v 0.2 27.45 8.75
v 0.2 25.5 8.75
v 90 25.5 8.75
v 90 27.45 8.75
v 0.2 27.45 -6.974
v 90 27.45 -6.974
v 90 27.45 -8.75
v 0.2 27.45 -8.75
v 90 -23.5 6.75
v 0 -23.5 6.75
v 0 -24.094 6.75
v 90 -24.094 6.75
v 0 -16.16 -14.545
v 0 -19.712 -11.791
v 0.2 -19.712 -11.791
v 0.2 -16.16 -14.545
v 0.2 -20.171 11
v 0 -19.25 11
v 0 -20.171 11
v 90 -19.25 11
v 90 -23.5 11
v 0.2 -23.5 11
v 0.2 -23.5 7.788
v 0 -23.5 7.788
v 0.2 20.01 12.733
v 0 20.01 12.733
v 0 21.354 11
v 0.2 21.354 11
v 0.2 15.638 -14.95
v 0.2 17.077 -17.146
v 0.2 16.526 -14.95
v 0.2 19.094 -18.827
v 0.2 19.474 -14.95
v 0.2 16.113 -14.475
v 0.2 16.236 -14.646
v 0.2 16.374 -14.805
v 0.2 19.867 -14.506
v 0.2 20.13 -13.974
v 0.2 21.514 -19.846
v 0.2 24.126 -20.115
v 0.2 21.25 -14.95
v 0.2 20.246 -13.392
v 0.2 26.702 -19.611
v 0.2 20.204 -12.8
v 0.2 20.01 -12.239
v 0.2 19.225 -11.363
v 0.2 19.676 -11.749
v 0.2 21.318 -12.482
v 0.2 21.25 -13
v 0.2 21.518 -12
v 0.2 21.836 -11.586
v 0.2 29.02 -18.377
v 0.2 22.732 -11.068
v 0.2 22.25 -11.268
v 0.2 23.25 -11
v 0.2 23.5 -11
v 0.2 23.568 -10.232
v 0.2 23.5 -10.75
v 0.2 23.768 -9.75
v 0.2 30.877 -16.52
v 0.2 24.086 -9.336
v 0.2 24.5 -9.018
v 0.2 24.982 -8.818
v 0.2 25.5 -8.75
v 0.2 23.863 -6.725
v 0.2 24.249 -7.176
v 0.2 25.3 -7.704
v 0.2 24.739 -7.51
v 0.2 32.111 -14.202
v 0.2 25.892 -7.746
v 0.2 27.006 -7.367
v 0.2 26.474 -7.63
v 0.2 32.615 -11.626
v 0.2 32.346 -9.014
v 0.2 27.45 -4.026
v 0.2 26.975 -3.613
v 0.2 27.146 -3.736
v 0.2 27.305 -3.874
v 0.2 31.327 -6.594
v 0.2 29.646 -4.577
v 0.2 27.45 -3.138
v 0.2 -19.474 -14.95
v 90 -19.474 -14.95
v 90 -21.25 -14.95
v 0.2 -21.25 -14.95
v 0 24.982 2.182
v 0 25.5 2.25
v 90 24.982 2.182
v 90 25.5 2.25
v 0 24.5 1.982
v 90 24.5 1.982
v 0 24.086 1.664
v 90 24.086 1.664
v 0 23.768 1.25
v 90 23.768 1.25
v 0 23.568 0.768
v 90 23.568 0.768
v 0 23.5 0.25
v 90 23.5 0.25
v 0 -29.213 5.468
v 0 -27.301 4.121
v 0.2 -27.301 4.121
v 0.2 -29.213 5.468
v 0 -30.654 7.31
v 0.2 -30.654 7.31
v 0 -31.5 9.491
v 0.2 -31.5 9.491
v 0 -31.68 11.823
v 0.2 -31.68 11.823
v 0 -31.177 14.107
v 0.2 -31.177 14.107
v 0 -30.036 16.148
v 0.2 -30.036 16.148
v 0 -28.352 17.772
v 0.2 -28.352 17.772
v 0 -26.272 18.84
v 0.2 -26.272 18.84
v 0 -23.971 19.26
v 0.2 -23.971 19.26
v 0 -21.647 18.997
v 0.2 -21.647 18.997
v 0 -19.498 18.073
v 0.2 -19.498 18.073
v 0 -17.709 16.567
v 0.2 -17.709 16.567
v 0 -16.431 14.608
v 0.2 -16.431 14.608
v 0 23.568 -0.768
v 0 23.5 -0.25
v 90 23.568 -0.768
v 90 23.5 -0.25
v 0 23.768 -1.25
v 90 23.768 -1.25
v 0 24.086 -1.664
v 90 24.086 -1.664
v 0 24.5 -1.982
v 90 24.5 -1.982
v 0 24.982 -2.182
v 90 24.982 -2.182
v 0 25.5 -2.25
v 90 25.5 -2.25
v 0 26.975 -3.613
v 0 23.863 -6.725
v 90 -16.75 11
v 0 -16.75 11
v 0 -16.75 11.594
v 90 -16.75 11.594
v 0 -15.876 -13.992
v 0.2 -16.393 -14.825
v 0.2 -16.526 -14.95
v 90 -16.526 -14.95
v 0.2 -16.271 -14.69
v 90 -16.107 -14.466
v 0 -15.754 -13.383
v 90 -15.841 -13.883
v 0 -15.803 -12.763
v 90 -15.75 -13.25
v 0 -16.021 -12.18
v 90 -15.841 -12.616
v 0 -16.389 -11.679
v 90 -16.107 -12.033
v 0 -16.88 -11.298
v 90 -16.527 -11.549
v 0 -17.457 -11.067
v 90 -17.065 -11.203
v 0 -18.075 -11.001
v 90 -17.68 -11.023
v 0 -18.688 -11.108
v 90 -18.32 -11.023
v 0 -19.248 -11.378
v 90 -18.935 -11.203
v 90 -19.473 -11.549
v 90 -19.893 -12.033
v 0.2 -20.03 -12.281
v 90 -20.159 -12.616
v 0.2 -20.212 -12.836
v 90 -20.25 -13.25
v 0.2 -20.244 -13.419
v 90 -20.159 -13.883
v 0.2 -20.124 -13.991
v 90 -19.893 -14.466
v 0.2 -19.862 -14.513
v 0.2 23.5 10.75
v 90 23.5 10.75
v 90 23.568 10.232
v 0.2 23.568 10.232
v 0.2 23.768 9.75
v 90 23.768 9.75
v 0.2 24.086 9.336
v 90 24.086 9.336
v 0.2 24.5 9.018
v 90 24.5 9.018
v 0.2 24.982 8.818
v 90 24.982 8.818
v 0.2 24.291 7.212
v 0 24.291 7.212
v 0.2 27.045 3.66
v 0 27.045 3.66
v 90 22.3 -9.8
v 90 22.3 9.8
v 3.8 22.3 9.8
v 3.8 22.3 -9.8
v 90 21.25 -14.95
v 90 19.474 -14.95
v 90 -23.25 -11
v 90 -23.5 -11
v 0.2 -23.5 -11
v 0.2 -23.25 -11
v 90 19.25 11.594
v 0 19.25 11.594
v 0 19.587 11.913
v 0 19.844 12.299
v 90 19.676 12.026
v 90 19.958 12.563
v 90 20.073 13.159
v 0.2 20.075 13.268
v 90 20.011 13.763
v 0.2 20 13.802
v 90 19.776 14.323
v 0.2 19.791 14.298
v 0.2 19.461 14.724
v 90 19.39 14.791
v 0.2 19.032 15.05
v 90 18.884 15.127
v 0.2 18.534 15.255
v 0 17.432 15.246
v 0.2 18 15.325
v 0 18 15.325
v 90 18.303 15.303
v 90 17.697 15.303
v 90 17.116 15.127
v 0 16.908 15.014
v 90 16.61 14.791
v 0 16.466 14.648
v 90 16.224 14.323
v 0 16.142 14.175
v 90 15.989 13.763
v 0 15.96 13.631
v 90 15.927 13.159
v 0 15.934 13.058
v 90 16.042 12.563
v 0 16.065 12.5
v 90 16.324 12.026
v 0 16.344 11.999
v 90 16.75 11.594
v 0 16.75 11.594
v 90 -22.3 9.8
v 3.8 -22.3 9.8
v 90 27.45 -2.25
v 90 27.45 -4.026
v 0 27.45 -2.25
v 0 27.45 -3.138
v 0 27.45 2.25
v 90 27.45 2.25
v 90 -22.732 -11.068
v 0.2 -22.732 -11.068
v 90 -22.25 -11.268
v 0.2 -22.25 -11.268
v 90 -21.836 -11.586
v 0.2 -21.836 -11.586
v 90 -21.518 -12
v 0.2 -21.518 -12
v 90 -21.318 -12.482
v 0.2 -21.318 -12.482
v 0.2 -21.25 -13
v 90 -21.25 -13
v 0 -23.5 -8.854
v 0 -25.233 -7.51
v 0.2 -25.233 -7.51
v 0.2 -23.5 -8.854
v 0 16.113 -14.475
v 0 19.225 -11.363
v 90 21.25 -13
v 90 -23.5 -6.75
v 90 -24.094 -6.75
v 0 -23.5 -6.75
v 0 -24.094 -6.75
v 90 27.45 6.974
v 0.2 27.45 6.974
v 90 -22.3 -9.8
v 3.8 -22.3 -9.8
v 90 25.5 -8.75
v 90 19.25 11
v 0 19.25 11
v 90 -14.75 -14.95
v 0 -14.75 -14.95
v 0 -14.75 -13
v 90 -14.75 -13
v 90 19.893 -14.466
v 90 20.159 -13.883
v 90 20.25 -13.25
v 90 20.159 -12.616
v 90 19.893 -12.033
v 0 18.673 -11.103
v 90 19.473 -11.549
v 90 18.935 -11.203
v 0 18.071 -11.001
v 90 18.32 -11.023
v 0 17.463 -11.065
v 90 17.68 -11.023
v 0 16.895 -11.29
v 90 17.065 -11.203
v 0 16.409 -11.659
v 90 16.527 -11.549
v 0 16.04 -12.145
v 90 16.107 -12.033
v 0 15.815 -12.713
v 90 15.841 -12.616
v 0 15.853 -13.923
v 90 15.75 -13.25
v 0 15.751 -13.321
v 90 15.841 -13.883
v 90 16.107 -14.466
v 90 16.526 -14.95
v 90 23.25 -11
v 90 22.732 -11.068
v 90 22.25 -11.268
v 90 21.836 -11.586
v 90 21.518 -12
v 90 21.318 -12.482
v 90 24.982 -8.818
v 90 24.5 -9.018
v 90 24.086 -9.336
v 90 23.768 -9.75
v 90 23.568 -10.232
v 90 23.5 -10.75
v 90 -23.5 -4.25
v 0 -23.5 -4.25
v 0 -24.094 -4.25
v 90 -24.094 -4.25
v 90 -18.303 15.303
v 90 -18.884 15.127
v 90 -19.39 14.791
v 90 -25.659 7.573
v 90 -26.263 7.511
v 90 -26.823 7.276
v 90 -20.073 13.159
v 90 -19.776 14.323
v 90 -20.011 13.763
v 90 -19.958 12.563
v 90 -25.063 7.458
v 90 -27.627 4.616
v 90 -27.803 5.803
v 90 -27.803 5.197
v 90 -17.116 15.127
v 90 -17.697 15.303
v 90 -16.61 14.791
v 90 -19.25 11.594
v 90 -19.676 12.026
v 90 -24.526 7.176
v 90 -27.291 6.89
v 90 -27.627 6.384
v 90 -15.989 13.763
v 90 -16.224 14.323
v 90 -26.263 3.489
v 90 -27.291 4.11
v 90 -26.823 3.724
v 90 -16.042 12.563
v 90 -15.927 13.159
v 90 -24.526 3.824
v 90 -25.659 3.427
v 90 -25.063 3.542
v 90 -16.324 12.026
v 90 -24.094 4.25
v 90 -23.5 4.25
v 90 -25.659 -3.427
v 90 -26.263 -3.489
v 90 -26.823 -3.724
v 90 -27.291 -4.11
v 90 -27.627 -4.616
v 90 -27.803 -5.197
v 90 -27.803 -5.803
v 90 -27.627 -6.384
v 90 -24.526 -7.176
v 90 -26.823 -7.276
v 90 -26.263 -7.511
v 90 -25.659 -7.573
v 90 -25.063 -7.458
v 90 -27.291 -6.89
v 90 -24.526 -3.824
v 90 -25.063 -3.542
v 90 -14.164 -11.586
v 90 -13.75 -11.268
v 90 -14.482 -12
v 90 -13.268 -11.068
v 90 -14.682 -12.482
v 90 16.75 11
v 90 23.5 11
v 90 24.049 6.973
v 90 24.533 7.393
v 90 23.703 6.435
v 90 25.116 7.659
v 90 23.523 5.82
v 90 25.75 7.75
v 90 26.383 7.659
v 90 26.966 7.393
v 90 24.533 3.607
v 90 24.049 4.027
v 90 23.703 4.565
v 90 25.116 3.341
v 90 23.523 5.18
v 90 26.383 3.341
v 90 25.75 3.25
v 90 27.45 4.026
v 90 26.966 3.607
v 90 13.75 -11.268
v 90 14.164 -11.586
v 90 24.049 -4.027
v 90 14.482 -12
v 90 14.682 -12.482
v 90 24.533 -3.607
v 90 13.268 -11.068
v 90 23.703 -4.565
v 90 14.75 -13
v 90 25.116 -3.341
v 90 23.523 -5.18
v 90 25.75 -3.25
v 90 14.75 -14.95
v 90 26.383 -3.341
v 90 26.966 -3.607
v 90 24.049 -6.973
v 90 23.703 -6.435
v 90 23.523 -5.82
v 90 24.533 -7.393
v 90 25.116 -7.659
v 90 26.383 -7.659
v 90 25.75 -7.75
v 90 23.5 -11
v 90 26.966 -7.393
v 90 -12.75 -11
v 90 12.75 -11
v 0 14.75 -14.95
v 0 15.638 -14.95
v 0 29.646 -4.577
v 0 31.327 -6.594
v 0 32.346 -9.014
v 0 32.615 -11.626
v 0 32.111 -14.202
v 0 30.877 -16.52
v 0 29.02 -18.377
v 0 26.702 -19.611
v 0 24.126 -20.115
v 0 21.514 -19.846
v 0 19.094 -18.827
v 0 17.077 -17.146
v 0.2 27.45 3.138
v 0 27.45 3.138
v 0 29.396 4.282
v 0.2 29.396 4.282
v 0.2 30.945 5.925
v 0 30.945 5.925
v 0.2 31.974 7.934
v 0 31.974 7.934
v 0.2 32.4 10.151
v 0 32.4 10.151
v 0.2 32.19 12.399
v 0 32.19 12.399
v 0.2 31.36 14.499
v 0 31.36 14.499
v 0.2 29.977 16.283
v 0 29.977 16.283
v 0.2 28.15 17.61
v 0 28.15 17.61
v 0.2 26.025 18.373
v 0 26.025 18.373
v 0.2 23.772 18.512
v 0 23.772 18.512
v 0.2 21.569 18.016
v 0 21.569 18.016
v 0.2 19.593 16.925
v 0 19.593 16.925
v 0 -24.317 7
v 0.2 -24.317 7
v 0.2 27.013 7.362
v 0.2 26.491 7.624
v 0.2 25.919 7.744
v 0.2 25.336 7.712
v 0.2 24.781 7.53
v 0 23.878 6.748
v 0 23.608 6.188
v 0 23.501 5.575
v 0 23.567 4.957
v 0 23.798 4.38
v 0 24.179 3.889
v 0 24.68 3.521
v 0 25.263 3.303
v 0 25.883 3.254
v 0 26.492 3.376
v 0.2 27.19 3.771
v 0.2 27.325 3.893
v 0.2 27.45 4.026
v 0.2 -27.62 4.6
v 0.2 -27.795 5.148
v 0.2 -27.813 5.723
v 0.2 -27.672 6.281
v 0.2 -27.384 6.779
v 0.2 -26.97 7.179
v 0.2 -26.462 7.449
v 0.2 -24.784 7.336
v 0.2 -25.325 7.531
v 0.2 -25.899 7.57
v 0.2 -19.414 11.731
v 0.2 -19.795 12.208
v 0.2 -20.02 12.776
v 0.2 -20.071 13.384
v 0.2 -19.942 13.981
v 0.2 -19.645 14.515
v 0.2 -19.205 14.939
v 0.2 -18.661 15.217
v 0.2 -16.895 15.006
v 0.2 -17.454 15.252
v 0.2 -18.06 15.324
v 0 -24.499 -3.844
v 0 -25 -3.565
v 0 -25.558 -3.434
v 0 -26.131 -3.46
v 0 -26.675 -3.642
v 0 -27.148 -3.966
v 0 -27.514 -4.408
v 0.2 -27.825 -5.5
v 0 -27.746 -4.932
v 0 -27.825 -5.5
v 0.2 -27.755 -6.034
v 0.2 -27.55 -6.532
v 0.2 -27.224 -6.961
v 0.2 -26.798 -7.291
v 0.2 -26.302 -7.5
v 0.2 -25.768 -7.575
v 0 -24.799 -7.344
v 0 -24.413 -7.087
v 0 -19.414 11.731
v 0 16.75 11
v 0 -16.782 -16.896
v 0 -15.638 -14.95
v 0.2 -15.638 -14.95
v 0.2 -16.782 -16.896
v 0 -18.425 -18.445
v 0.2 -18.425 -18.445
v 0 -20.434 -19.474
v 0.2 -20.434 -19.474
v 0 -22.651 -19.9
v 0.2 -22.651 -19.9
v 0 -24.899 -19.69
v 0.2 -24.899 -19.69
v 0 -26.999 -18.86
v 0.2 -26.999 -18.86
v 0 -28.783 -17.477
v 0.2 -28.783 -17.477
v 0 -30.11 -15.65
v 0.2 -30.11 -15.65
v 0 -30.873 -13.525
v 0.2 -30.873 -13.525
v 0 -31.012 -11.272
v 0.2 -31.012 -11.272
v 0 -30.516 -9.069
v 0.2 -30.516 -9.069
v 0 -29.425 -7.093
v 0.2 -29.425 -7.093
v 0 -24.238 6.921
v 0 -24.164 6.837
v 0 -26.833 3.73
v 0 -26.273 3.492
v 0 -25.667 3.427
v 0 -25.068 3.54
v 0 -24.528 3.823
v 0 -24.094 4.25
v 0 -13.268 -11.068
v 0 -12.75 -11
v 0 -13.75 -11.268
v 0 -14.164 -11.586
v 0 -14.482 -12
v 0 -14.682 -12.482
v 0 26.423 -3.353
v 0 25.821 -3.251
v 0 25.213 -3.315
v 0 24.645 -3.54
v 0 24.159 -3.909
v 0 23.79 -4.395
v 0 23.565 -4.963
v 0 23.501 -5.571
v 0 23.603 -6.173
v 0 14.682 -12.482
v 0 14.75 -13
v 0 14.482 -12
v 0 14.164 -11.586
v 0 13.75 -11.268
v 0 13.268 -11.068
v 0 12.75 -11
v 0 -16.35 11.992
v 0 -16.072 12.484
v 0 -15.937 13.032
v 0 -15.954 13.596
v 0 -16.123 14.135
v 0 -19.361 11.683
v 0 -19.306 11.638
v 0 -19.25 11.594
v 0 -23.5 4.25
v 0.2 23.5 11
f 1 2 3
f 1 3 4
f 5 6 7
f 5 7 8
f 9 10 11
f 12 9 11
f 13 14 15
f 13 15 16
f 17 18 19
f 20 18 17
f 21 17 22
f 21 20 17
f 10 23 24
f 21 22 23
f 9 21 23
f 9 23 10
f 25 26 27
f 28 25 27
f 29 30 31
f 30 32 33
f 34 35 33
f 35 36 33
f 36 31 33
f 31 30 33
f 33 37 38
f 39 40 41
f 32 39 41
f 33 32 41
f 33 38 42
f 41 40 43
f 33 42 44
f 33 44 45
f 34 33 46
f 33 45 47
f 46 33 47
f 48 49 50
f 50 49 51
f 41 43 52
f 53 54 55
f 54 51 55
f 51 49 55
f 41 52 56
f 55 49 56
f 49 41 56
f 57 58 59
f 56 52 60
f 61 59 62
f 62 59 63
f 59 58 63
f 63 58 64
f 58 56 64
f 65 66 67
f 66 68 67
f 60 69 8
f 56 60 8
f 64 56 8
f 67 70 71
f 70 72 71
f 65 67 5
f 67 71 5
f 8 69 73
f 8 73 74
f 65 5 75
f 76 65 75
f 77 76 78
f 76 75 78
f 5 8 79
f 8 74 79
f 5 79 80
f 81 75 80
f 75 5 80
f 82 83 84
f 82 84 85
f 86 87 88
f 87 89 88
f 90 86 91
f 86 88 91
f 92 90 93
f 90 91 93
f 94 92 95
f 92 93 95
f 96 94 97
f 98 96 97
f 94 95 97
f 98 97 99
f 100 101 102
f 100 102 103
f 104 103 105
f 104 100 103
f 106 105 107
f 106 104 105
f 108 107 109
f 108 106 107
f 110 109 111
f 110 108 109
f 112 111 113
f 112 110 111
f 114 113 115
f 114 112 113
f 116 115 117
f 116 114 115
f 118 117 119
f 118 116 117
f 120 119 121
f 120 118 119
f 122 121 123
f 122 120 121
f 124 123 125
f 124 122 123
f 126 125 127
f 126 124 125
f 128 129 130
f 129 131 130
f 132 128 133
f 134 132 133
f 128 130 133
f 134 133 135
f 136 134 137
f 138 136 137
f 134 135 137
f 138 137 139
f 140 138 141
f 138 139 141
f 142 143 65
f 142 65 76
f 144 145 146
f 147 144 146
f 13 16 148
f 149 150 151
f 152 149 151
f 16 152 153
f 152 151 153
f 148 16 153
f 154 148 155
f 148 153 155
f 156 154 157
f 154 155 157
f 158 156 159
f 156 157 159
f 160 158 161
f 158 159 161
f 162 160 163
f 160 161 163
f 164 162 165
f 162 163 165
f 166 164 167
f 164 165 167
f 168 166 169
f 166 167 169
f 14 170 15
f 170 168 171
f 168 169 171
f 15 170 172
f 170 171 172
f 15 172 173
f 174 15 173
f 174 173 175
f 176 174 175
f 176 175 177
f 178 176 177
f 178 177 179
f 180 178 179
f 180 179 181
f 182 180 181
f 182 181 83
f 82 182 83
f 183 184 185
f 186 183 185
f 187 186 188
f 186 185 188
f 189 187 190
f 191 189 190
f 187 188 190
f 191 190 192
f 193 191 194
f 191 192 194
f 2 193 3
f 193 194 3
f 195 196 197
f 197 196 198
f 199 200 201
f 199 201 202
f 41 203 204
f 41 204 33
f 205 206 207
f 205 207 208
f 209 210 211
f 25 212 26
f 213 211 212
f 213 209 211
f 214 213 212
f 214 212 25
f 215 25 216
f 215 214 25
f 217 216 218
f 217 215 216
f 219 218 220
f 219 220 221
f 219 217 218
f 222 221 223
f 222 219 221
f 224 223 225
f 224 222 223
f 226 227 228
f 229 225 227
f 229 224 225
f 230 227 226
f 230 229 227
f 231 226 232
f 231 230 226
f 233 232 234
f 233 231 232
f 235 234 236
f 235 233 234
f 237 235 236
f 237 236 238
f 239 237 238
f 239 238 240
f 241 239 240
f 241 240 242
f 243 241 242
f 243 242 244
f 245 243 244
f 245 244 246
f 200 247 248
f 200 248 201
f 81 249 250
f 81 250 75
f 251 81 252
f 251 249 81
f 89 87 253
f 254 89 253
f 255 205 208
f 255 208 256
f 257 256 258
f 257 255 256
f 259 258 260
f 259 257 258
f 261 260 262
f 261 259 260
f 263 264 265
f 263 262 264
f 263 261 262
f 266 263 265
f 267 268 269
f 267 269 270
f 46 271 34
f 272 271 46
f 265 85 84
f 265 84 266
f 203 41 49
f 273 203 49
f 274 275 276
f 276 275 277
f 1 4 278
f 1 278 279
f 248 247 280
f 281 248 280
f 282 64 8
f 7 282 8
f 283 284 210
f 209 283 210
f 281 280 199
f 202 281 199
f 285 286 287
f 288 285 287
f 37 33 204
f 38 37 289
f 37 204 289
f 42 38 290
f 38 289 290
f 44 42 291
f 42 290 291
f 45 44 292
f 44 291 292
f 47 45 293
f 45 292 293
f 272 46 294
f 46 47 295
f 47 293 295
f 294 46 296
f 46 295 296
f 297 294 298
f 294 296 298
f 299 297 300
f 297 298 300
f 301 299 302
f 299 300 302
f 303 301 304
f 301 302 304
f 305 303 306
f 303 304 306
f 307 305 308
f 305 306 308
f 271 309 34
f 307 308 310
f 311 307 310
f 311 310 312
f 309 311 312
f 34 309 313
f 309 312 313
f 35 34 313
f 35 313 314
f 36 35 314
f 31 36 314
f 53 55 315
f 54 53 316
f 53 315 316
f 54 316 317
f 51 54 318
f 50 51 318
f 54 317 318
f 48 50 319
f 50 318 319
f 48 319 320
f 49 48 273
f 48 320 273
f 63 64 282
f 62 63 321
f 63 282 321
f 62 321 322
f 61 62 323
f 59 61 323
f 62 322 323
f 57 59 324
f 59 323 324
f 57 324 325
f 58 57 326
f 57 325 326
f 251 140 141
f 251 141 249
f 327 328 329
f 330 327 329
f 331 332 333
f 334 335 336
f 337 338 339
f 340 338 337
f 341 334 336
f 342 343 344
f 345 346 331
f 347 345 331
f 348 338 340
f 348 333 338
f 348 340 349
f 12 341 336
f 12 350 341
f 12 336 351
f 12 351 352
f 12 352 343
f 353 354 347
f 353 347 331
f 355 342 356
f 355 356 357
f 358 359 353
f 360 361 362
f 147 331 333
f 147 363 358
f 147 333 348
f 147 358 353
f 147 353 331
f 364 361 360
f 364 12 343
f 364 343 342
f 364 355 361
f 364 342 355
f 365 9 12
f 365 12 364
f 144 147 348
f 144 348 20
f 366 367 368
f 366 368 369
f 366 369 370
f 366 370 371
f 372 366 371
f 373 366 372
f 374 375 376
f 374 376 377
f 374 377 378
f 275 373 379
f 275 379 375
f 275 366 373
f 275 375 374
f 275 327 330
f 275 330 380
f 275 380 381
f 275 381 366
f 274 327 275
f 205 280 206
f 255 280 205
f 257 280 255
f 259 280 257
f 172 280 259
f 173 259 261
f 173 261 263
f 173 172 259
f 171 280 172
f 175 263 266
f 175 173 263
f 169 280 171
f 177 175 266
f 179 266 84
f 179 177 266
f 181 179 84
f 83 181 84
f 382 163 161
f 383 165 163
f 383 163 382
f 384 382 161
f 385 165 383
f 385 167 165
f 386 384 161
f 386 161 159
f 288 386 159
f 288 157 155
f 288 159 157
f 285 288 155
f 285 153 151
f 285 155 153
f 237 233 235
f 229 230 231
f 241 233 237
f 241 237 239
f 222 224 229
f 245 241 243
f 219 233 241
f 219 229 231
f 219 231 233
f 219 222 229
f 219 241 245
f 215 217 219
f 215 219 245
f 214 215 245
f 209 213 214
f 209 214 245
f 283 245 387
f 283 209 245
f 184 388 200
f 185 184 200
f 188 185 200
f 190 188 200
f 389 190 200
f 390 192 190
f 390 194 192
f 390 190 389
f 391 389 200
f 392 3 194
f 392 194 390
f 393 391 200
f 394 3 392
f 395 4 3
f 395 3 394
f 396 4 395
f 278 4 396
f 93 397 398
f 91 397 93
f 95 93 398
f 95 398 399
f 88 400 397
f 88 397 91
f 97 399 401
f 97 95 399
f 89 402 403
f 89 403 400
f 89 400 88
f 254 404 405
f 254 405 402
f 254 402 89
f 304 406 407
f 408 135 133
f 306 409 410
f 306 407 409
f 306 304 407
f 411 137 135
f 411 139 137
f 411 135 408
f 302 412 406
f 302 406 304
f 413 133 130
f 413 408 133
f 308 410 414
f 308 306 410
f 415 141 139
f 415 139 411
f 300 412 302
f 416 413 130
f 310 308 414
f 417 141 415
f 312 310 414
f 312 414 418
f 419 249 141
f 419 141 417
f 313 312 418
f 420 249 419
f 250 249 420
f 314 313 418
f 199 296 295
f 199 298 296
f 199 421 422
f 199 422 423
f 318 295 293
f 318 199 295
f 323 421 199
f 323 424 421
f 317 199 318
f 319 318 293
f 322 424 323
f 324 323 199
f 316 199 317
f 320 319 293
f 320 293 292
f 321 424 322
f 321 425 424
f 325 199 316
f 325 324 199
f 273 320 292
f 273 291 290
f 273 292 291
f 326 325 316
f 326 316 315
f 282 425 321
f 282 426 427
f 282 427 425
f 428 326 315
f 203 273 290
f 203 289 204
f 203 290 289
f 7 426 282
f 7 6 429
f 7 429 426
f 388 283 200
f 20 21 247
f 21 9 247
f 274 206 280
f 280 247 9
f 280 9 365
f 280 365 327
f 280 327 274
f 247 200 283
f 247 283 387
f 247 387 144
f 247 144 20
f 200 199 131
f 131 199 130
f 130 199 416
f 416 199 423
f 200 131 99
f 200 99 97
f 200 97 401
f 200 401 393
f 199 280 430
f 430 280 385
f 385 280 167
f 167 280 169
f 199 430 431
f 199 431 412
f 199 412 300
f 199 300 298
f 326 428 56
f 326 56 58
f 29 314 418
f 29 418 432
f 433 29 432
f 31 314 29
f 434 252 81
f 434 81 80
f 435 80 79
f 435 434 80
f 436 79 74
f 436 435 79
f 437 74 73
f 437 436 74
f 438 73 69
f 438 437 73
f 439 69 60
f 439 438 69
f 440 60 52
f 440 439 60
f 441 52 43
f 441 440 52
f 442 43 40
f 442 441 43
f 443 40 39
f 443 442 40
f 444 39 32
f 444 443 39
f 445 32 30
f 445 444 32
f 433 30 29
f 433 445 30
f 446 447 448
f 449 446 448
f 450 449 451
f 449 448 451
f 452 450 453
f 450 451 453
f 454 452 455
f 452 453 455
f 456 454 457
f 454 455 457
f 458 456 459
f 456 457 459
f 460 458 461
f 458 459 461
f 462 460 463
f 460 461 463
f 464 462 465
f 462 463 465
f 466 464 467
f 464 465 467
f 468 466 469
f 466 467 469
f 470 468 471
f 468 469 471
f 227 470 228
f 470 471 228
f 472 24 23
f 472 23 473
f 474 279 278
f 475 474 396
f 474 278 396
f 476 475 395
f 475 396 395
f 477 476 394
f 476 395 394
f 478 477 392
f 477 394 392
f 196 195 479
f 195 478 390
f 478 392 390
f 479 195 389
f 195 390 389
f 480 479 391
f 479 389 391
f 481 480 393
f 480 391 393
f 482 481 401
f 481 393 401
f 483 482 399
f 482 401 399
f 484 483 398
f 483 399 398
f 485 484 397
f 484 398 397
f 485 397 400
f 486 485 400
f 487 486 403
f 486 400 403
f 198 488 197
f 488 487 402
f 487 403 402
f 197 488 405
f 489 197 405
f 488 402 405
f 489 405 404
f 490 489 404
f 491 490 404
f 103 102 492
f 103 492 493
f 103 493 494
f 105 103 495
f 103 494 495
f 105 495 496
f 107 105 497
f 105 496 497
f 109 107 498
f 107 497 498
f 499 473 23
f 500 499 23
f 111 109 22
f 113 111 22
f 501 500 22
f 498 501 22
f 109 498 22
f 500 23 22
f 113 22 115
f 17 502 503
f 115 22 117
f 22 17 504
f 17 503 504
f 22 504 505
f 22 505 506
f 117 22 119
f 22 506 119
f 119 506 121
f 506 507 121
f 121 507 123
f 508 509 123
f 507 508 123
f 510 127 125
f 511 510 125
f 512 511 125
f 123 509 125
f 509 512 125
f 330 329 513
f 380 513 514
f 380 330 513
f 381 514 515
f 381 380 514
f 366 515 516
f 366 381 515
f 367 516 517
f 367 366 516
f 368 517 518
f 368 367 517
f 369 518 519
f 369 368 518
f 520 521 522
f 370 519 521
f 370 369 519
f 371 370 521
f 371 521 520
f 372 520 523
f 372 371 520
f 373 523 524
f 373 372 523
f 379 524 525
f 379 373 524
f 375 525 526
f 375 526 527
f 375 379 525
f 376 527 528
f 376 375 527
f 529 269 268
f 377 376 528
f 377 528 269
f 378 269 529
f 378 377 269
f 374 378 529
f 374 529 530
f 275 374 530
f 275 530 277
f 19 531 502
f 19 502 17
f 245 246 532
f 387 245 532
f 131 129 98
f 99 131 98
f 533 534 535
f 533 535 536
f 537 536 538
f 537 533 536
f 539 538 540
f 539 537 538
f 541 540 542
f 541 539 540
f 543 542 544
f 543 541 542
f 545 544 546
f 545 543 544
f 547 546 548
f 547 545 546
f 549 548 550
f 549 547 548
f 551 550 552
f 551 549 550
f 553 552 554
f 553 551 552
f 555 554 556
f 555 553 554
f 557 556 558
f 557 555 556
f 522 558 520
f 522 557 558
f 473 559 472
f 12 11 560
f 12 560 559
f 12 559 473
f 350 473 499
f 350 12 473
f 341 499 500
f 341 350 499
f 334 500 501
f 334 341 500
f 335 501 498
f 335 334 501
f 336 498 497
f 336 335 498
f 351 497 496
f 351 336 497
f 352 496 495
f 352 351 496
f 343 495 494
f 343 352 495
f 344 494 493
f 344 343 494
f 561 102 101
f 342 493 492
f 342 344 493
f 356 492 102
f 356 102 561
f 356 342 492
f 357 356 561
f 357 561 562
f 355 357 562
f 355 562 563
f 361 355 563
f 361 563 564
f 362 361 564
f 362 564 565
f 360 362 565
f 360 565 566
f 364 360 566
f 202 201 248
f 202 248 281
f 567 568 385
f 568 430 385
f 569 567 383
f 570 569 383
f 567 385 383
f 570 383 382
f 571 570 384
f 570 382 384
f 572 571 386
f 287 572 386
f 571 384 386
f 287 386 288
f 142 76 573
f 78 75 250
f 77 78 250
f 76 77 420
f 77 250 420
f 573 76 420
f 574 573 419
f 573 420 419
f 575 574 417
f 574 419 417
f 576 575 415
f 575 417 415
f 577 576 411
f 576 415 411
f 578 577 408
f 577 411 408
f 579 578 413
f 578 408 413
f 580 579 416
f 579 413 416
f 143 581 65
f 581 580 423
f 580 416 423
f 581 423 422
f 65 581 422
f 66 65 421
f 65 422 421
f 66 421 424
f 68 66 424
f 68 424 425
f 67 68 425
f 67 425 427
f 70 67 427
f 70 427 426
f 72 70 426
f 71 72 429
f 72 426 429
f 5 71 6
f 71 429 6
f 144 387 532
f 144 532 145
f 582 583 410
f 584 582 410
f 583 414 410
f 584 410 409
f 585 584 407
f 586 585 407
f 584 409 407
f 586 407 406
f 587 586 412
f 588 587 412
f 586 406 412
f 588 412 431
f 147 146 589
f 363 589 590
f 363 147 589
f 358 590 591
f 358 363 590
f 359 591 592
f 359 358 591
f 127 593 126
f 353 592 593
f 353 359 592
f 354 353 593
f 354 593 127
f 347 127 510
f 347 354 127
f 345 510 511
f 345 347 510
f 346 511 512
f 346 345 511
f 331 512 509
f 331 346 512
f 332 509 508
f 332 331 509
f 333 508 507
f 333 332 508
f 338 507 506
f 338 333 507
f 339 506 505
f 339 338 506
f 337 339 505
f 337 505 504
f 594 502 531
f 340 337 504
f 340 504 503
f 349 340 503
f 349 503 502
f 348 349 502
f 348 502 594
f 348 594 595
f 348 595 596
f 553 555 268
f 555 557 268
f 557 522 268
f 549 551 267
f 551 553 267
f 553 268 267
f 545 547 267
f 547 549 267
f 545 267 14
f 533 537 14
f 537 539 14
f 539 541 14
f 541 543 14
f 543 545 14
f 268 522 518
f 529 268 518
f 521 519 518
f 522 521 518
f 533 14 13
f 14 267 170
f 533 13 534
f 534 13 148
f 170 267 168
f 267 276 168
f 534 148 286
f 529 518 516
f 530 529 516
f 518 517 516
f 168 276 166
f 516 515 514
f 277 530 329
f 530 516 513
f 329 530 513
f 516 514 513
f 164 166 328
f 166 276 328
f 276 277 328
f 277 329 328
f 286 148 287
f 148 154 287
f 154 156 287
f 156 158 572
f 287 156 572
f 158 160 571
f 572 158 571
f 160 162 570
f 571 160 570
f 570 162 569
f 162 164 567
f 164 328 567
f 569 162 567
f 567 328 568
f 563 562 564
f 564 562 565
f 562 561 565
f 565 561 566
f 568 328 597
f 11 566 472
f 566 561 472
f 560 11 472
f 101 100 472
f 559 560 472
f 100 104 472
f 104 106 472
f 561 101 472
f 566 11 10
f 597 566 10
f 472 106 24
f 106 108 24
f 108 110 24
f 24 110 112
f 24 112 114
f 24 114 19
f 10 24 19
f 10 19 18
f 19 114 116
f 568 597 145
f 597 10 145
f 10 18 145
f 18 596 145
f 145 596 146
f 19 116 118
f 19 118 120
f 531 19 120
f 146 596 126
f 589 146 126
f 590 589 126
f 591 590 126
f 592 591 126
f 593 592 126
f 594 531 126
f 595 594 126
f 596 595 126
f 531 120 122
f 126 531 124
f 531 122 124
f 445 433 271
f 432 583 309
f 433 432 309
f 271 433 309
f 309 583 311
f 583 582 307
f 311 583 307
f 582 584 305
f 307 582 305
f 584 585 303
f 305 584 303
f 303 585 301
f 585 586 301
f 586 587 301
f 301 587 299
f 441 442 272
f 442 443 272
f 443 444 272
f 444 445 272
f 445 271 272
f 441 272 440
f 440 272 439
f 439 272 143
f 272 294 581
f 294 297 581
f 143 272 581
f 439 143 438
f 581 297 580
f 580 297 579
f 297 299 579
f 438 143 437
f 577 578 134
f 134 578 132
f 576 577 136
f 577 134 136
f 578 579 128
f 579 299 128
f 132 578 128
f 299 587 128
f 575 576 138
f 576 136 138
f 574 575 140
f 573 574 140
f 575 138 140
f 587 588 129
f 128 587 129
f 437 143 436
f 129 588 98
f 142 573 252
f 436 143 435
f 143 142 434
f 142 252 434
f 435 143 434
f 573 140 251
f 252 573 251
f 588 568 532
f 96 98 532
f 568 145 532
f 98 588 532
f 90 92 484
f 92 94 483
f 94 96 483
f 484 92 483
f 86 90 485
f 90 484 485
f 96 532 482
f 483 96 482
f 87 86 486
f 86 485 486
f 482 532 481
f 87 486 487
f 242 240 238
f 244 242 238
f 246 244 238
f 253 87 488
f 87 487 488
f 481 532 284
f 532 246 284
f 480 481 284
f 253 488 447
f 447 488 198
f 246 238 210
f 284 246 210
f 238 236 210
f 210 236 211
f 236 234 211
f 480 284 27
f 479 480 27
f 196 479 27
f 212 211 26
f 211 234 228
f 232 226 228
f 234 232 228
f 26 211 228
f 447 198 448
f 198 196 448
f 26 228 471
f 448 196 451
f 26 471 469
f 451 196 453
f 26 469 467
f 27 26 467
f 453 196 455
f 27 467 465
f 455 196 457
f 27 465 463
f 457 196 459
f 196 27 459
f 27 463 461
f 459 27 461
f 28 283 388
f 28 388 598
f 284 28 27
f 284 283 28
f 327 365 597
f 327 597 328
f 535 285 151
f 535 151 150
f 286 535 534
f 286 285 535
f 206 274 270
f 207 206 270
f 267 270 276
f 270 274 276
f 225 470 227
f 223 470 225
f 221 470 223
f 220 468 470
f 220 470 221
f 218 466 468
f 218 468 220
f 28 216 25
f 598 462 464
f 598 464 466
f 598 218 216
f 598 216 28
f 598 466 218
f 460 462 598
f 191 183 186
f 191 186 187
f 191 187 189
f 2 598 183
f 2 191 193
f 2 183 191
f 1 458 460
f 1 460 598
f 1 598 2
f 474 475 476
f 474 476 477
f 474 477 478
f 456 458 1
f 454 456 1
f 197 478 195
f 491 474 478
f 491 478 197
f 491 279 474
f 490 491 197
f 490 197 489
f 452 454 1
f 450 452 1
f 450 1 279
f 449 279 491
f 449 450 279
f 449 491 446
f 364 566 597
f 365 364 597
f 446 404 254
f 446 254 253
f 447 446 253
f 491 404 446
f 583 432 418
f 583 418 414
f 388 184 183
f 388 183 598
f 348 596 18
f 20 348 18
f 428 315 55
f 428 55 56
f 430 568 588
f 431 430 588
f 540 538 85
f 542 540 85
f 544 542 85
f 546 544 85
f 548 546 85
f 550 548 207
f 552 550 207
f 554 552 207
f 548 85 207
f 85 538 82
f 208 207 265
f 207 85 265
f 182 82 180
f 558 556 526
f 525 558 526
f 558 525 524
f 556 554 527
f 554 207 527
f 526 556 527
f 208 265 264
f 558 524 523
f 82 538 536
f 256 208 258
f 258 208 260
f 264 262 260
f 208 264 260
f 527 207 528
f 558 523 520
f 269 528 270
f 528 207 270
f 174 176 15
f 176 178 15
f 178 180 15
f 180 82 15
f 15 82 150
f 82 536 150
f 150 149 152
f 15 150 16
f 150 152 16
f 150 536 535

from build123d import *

# Parameters (mm, degrees)
EXTRUDE_1_DEPTH             = 90
SKETCH_2_W                  = 90
SKETCH_2_H                  = 17.75
EXTRUDE_2_DEPTH             = 8.2
SKETCH_3_W                  = 90
SKETCH_3_H                  = 50.95
EXTRUDE_3_DEPTH             = 8.2
SKETCH_4_W                  = 3.95
SKETCH_4_H                  = 29.5
CUT_EXTRUDE_1_DEPTH         = 91
SKETCH_5_W                  = 3.95
SKETCH_5_H                  = 6.2
CUT_EXTRUDE_2_DEPTH         = 91
SKETCH_6_W                  = 2.25
SKETCH_6_H                  = 3.95
CUT_EXTRUDE_3_DEPTH         = 91
SKETCH_7_W                  = 4.5
SKETCH_7_H                  = 3.95
CUT_EXTRUDE_4_DEPTH         = 91
SKETCH_8_W                  = 2.25
SKETCH_8_H                  = 3.95
CUT_EXTRUDE_5_DEPTH         = 91
SKETCH_9_W                  = 3.95
SKETCH_9_H                  = 2.25
CUT_EXTRUDE_6_DEPTH         = 91
SKETCH_10_W                 = 19.6
SKETCH_10_H                 = 44.6
CUT_EXTRUDE_7_DEPTH         = 86.2
HOLE_WIZARD_2_5_2_5_1_D     = 2.5
HOLE_WIZARD_2_5_2_5_1_DEPTH = 90
HOLE_WIZARD_4_5_4_5_1_D     = 4.5
HOLE_WIZARD_4_5_4_5_1_DEPTH = 90
FILLET_1_R                  = 2
FILLET_2_R                  = 2
SKETCH_17_R                 = 1.25
EXTRUDE_4_DEPTH             = 90
EXTRUDE_5_DEPTH             = 0.2


with BuildPart() as part:
    # Эскиз1 → Бобышка-Вытянуть1 (new body)
    with BuildSketch(Plane(origin=(90, 0, 0), x_dir=(0, 0, -1), z_dir=(1, 0, 0))):
        with BuildLine():
            Line((6.75, -24.093761792), (6.75, 19.25))
            Line((6.75, 19.25), (-11.593761792, 19.25))
            ThreePointArc((-11.593761792, 19.25), (-15.325, 18), (-11.593761792, 16.75))
            Line((-11.593761792, 16.75), (-11, 16.75))
            Line((-11, 16.75), (-11, -16.75))
            Line((-11, -16.75), (-11.593761792, -16.75))
            ThreePointArc((-11.593761792, -16.75), (-15.325, -18), (-11.593761792, -19.25))
            Line((-11.593761792, -19.25), (-11, -19.25))
            Line((-11, -19.25), (-11, -23.5))
            Line((-11, -23.5), (-6.75, -23.5))
            Line((-6.75, -23.5), (-6.75, -24.093761792))
            ThreePointArc((-6.75, -24.093761792), (-5.5, -27.825), (-4.25, -24.093761792))
            Line((-4.25, -24.093761792), (-4.25, -23.5))
            Line((-4.25, -23.5), (4.25, -23.5))
            Line((4.25, -23.5), (4.25, -24.093761792))
            ThreePointArc((4.25, -24.093761792), (5.5, -27.825), (6.75, -24.093761792))
        make_face()
    extrude(amount=-EXTRUDE_1_DEPTH)

    # Эскиз2 → Бобышка-Вытянуть2 (add)
    with BuildSketch(Plane(origin=(0, 19.25, 0), x_dir=(-1, 0, 0), z_dir=(0, 1, 0))):
        with Locations((-45, 2.125)):
            Rectangle(SKETCH_2_W, SKETCH_2_H)
    extrude(amount=EXTRUDE_2_DEPTH)

    # Эскиз3 → Бобышка-Вытянуть3 (add)
    with BuildSketch(Plane(origin=(0, 0, -6.75), x_dir=(-1, 0, 0), z_dir=(0, 0, -1))):
        with Locations((-45, 1.975)):
            Rectangle(SKETCH_3_W, SKETCH_3_H)
    extrude(amount=EXTRUDE_3_DEPTH)

    # Эскиз4 → Вырез-Вытянуть1 (cut, through all)
    with BuildSketch(Plane.ZY):
        with Locations((-12.975, 0)):
            Rectangle(SKETCH_4_W, SKETCH_4_H)
    extrude(amount=-CUT_EXTRUDE_1_DEPTH, mode=Mode.SUBTRACT)

    # Эскиз5 → Вырез-Вытянуть2 (cut, through all)
    with BuildSketch(Plane.ZY):
        with Locations((-12.975, 24.35)):
            Rectangle(SKETCH_5_W, SKETCH_5_H)
    extrude(amount=-CUT_EXTRUDE_2_DEPTH, mode=Mode.SUBTRACT)

    # Эскиз6 → Вырез-Вытянуть3 (cut, through all)
    with BuildSketch(Plane.ZY):
        with Locations((-9.875, 25.475)):
            Rectangle(SKETCH_6_W, SKETCH_6_H)
    extrude(amount=-CUT_EXTRUDE_3_DEPTH, mode=Mode.SUBTRACT)

    # Эскиз7 → Вырез-Вытянуть4 (cut, through all)
    with BuildSketch(Plane.ZY):
        with Locations((0, 25.475)):
            Rectangle(SKETCH_7_W, SKETCH_7_H)
    extrude(amount=-CUT_EXTRUDE_4_DEPTH, mode=Mode.SUBTRACT)

    # Эскиз8 → Вырез-Вытянуть5 (cut, through all)
    with BuildSketch(Plane.ZY):
        with Locations((9.875, 25.475)):
            Rectangle(SKETCH_8_W, SKETCH_8_H)
    extrude(amount=-CUT_EXTRUDE_5_DEPTH, mode=Mode.SUBTRACT)

    # Эскиз9 → Вырез-Вытянуть6 (cut, through all)
    with BuildSketch(Plane.ZY):
        with Locations((-12.975, -22.375)):
            Rectangle(SKETCH_9_W, SKETCH_9_H)
    extrude(amount=-CUT_EXTRUDE_6_DEPTH, mode=Mode.SUBTRACT)

    # Эскиз10 → Вырез-Вытянуть7 (cut)
    with BuildSketch(Plane(origin=(90, 0, 0), x_dir=(0, 0, -1), z_dir=(1, 0, 0))):
        Rectangle(SKETCH_10_W, SKETCH_10_H)
    extrude(amount=-CUT_EXTRUDE_7_DEPTH, mode=Mode.SUBTRACT)

    # Диаметр отверстия Ø2.5 (2.5)1
    with Locations(Plane(origin=(90, 0, 0), x_dir=(0, 0, -1), z_dir=(1, 0, 0))):
        with Locations((5.5, -25.75), (-13.25, -18), (-5.5, -25.75), (-13.25, 18)):
            Hole(HOLE_WIZARD_2_5_2_5_1_D / 2, depth=HOLE_WIZARD_2_5_2_5_1_DEPTH)

    # Диаметр отверстия Ø4.5 (4.5)1
    with Locations(Plane.ZY):
        with Locations((-13.25, -18), (-13.25, 18), (-5.5, 25.75), (5.5, 25.75)):
            Hole(HOLE_WIZARD_4_5_4_5_1_D / 2, depth=HOLE_WIZARD_4_5_4_5_1_DEPTH)

    # Скругление1
    fillet_1_edges = [part.edges().sort_by_distance(p)[0] for p in [
        (45, 23.5, 8.75),
    ]]
    fillet(fillet_1_edges, radius=FILLET_1_R)

    # Скругление2
    fillet_2_edges = [part.edges().sort_by_distance(p)[0] for p in [
        (45, 23.5, -8.75),
        (45, 23.5, 2.25),
        (45, 23.5, -2.25),
        (45, -21.25, -11),
        (45, 14.75, -11),
        (45, -14.75, -11),
        (45, 21.25, -11),
    ]]
    fillet(fillet_2_edges, radius=FILLET_2_R)

    # Эскиз17 → Бобышка-Вытянуть4 (add)
    with BuildSketch(Plane(origin=(90, 0, 0), x_dir=(0, 0, -1), z_dir=(1, 0, 0))):
        with Locations((5.5, -25.75)):
            Circle(SKETCH_17_R)
        with Locations((-5.5, -25.75)):
            Circle(SKETCH_17_R)
        with Locations((-13.25, -18)):
            Circle(SKETCH_17_R)
        with Locations((-13.25, 18)):
            Circle(SKETCH_17_R)
    extrude(amount=-EXTRUDE_4_DEPTH)

    # Эскиз19 → Бобышка-Вытянуть5 (add)
    with BuildSketch(Plane.ZY):
        with BuildLine():
            Line((-14.95, 15.638029851), (-3.138029851, 27.45))
            ThreePointArc((-3.138029851, 27.45), (-17.517080976, 30.017080976), (-14.95, 15.638029851))
        make_face()
        with BuildLine():
            Line((15.325, 18), (3.138029851, 27.45))
            ThreePointArc((3.138029851, 27.45), (15.439952139, 30.731564972), (15.325, 18))
        make_face()
        with BuildLine():
            Line((14.608219689, -16.431285789), (4.121265041, -27.300714324))
            ThreePointArc((4.121265041, -27.300714324), (17.021902806, -29.253720028), (14.608219689, -16.431285789))
        make_face()
        with BuildLine():
            Line((-5.5, -27.825), (-14.95, -15.638029851))
            ThreePointArc((-14.95, -15.638029851), (-18.231564972, -27.939952139), (-5.5, -27.825))
        make_face()
    extrude(amount=-EXTRUDE_5_DEPTH)


solid = part.part
